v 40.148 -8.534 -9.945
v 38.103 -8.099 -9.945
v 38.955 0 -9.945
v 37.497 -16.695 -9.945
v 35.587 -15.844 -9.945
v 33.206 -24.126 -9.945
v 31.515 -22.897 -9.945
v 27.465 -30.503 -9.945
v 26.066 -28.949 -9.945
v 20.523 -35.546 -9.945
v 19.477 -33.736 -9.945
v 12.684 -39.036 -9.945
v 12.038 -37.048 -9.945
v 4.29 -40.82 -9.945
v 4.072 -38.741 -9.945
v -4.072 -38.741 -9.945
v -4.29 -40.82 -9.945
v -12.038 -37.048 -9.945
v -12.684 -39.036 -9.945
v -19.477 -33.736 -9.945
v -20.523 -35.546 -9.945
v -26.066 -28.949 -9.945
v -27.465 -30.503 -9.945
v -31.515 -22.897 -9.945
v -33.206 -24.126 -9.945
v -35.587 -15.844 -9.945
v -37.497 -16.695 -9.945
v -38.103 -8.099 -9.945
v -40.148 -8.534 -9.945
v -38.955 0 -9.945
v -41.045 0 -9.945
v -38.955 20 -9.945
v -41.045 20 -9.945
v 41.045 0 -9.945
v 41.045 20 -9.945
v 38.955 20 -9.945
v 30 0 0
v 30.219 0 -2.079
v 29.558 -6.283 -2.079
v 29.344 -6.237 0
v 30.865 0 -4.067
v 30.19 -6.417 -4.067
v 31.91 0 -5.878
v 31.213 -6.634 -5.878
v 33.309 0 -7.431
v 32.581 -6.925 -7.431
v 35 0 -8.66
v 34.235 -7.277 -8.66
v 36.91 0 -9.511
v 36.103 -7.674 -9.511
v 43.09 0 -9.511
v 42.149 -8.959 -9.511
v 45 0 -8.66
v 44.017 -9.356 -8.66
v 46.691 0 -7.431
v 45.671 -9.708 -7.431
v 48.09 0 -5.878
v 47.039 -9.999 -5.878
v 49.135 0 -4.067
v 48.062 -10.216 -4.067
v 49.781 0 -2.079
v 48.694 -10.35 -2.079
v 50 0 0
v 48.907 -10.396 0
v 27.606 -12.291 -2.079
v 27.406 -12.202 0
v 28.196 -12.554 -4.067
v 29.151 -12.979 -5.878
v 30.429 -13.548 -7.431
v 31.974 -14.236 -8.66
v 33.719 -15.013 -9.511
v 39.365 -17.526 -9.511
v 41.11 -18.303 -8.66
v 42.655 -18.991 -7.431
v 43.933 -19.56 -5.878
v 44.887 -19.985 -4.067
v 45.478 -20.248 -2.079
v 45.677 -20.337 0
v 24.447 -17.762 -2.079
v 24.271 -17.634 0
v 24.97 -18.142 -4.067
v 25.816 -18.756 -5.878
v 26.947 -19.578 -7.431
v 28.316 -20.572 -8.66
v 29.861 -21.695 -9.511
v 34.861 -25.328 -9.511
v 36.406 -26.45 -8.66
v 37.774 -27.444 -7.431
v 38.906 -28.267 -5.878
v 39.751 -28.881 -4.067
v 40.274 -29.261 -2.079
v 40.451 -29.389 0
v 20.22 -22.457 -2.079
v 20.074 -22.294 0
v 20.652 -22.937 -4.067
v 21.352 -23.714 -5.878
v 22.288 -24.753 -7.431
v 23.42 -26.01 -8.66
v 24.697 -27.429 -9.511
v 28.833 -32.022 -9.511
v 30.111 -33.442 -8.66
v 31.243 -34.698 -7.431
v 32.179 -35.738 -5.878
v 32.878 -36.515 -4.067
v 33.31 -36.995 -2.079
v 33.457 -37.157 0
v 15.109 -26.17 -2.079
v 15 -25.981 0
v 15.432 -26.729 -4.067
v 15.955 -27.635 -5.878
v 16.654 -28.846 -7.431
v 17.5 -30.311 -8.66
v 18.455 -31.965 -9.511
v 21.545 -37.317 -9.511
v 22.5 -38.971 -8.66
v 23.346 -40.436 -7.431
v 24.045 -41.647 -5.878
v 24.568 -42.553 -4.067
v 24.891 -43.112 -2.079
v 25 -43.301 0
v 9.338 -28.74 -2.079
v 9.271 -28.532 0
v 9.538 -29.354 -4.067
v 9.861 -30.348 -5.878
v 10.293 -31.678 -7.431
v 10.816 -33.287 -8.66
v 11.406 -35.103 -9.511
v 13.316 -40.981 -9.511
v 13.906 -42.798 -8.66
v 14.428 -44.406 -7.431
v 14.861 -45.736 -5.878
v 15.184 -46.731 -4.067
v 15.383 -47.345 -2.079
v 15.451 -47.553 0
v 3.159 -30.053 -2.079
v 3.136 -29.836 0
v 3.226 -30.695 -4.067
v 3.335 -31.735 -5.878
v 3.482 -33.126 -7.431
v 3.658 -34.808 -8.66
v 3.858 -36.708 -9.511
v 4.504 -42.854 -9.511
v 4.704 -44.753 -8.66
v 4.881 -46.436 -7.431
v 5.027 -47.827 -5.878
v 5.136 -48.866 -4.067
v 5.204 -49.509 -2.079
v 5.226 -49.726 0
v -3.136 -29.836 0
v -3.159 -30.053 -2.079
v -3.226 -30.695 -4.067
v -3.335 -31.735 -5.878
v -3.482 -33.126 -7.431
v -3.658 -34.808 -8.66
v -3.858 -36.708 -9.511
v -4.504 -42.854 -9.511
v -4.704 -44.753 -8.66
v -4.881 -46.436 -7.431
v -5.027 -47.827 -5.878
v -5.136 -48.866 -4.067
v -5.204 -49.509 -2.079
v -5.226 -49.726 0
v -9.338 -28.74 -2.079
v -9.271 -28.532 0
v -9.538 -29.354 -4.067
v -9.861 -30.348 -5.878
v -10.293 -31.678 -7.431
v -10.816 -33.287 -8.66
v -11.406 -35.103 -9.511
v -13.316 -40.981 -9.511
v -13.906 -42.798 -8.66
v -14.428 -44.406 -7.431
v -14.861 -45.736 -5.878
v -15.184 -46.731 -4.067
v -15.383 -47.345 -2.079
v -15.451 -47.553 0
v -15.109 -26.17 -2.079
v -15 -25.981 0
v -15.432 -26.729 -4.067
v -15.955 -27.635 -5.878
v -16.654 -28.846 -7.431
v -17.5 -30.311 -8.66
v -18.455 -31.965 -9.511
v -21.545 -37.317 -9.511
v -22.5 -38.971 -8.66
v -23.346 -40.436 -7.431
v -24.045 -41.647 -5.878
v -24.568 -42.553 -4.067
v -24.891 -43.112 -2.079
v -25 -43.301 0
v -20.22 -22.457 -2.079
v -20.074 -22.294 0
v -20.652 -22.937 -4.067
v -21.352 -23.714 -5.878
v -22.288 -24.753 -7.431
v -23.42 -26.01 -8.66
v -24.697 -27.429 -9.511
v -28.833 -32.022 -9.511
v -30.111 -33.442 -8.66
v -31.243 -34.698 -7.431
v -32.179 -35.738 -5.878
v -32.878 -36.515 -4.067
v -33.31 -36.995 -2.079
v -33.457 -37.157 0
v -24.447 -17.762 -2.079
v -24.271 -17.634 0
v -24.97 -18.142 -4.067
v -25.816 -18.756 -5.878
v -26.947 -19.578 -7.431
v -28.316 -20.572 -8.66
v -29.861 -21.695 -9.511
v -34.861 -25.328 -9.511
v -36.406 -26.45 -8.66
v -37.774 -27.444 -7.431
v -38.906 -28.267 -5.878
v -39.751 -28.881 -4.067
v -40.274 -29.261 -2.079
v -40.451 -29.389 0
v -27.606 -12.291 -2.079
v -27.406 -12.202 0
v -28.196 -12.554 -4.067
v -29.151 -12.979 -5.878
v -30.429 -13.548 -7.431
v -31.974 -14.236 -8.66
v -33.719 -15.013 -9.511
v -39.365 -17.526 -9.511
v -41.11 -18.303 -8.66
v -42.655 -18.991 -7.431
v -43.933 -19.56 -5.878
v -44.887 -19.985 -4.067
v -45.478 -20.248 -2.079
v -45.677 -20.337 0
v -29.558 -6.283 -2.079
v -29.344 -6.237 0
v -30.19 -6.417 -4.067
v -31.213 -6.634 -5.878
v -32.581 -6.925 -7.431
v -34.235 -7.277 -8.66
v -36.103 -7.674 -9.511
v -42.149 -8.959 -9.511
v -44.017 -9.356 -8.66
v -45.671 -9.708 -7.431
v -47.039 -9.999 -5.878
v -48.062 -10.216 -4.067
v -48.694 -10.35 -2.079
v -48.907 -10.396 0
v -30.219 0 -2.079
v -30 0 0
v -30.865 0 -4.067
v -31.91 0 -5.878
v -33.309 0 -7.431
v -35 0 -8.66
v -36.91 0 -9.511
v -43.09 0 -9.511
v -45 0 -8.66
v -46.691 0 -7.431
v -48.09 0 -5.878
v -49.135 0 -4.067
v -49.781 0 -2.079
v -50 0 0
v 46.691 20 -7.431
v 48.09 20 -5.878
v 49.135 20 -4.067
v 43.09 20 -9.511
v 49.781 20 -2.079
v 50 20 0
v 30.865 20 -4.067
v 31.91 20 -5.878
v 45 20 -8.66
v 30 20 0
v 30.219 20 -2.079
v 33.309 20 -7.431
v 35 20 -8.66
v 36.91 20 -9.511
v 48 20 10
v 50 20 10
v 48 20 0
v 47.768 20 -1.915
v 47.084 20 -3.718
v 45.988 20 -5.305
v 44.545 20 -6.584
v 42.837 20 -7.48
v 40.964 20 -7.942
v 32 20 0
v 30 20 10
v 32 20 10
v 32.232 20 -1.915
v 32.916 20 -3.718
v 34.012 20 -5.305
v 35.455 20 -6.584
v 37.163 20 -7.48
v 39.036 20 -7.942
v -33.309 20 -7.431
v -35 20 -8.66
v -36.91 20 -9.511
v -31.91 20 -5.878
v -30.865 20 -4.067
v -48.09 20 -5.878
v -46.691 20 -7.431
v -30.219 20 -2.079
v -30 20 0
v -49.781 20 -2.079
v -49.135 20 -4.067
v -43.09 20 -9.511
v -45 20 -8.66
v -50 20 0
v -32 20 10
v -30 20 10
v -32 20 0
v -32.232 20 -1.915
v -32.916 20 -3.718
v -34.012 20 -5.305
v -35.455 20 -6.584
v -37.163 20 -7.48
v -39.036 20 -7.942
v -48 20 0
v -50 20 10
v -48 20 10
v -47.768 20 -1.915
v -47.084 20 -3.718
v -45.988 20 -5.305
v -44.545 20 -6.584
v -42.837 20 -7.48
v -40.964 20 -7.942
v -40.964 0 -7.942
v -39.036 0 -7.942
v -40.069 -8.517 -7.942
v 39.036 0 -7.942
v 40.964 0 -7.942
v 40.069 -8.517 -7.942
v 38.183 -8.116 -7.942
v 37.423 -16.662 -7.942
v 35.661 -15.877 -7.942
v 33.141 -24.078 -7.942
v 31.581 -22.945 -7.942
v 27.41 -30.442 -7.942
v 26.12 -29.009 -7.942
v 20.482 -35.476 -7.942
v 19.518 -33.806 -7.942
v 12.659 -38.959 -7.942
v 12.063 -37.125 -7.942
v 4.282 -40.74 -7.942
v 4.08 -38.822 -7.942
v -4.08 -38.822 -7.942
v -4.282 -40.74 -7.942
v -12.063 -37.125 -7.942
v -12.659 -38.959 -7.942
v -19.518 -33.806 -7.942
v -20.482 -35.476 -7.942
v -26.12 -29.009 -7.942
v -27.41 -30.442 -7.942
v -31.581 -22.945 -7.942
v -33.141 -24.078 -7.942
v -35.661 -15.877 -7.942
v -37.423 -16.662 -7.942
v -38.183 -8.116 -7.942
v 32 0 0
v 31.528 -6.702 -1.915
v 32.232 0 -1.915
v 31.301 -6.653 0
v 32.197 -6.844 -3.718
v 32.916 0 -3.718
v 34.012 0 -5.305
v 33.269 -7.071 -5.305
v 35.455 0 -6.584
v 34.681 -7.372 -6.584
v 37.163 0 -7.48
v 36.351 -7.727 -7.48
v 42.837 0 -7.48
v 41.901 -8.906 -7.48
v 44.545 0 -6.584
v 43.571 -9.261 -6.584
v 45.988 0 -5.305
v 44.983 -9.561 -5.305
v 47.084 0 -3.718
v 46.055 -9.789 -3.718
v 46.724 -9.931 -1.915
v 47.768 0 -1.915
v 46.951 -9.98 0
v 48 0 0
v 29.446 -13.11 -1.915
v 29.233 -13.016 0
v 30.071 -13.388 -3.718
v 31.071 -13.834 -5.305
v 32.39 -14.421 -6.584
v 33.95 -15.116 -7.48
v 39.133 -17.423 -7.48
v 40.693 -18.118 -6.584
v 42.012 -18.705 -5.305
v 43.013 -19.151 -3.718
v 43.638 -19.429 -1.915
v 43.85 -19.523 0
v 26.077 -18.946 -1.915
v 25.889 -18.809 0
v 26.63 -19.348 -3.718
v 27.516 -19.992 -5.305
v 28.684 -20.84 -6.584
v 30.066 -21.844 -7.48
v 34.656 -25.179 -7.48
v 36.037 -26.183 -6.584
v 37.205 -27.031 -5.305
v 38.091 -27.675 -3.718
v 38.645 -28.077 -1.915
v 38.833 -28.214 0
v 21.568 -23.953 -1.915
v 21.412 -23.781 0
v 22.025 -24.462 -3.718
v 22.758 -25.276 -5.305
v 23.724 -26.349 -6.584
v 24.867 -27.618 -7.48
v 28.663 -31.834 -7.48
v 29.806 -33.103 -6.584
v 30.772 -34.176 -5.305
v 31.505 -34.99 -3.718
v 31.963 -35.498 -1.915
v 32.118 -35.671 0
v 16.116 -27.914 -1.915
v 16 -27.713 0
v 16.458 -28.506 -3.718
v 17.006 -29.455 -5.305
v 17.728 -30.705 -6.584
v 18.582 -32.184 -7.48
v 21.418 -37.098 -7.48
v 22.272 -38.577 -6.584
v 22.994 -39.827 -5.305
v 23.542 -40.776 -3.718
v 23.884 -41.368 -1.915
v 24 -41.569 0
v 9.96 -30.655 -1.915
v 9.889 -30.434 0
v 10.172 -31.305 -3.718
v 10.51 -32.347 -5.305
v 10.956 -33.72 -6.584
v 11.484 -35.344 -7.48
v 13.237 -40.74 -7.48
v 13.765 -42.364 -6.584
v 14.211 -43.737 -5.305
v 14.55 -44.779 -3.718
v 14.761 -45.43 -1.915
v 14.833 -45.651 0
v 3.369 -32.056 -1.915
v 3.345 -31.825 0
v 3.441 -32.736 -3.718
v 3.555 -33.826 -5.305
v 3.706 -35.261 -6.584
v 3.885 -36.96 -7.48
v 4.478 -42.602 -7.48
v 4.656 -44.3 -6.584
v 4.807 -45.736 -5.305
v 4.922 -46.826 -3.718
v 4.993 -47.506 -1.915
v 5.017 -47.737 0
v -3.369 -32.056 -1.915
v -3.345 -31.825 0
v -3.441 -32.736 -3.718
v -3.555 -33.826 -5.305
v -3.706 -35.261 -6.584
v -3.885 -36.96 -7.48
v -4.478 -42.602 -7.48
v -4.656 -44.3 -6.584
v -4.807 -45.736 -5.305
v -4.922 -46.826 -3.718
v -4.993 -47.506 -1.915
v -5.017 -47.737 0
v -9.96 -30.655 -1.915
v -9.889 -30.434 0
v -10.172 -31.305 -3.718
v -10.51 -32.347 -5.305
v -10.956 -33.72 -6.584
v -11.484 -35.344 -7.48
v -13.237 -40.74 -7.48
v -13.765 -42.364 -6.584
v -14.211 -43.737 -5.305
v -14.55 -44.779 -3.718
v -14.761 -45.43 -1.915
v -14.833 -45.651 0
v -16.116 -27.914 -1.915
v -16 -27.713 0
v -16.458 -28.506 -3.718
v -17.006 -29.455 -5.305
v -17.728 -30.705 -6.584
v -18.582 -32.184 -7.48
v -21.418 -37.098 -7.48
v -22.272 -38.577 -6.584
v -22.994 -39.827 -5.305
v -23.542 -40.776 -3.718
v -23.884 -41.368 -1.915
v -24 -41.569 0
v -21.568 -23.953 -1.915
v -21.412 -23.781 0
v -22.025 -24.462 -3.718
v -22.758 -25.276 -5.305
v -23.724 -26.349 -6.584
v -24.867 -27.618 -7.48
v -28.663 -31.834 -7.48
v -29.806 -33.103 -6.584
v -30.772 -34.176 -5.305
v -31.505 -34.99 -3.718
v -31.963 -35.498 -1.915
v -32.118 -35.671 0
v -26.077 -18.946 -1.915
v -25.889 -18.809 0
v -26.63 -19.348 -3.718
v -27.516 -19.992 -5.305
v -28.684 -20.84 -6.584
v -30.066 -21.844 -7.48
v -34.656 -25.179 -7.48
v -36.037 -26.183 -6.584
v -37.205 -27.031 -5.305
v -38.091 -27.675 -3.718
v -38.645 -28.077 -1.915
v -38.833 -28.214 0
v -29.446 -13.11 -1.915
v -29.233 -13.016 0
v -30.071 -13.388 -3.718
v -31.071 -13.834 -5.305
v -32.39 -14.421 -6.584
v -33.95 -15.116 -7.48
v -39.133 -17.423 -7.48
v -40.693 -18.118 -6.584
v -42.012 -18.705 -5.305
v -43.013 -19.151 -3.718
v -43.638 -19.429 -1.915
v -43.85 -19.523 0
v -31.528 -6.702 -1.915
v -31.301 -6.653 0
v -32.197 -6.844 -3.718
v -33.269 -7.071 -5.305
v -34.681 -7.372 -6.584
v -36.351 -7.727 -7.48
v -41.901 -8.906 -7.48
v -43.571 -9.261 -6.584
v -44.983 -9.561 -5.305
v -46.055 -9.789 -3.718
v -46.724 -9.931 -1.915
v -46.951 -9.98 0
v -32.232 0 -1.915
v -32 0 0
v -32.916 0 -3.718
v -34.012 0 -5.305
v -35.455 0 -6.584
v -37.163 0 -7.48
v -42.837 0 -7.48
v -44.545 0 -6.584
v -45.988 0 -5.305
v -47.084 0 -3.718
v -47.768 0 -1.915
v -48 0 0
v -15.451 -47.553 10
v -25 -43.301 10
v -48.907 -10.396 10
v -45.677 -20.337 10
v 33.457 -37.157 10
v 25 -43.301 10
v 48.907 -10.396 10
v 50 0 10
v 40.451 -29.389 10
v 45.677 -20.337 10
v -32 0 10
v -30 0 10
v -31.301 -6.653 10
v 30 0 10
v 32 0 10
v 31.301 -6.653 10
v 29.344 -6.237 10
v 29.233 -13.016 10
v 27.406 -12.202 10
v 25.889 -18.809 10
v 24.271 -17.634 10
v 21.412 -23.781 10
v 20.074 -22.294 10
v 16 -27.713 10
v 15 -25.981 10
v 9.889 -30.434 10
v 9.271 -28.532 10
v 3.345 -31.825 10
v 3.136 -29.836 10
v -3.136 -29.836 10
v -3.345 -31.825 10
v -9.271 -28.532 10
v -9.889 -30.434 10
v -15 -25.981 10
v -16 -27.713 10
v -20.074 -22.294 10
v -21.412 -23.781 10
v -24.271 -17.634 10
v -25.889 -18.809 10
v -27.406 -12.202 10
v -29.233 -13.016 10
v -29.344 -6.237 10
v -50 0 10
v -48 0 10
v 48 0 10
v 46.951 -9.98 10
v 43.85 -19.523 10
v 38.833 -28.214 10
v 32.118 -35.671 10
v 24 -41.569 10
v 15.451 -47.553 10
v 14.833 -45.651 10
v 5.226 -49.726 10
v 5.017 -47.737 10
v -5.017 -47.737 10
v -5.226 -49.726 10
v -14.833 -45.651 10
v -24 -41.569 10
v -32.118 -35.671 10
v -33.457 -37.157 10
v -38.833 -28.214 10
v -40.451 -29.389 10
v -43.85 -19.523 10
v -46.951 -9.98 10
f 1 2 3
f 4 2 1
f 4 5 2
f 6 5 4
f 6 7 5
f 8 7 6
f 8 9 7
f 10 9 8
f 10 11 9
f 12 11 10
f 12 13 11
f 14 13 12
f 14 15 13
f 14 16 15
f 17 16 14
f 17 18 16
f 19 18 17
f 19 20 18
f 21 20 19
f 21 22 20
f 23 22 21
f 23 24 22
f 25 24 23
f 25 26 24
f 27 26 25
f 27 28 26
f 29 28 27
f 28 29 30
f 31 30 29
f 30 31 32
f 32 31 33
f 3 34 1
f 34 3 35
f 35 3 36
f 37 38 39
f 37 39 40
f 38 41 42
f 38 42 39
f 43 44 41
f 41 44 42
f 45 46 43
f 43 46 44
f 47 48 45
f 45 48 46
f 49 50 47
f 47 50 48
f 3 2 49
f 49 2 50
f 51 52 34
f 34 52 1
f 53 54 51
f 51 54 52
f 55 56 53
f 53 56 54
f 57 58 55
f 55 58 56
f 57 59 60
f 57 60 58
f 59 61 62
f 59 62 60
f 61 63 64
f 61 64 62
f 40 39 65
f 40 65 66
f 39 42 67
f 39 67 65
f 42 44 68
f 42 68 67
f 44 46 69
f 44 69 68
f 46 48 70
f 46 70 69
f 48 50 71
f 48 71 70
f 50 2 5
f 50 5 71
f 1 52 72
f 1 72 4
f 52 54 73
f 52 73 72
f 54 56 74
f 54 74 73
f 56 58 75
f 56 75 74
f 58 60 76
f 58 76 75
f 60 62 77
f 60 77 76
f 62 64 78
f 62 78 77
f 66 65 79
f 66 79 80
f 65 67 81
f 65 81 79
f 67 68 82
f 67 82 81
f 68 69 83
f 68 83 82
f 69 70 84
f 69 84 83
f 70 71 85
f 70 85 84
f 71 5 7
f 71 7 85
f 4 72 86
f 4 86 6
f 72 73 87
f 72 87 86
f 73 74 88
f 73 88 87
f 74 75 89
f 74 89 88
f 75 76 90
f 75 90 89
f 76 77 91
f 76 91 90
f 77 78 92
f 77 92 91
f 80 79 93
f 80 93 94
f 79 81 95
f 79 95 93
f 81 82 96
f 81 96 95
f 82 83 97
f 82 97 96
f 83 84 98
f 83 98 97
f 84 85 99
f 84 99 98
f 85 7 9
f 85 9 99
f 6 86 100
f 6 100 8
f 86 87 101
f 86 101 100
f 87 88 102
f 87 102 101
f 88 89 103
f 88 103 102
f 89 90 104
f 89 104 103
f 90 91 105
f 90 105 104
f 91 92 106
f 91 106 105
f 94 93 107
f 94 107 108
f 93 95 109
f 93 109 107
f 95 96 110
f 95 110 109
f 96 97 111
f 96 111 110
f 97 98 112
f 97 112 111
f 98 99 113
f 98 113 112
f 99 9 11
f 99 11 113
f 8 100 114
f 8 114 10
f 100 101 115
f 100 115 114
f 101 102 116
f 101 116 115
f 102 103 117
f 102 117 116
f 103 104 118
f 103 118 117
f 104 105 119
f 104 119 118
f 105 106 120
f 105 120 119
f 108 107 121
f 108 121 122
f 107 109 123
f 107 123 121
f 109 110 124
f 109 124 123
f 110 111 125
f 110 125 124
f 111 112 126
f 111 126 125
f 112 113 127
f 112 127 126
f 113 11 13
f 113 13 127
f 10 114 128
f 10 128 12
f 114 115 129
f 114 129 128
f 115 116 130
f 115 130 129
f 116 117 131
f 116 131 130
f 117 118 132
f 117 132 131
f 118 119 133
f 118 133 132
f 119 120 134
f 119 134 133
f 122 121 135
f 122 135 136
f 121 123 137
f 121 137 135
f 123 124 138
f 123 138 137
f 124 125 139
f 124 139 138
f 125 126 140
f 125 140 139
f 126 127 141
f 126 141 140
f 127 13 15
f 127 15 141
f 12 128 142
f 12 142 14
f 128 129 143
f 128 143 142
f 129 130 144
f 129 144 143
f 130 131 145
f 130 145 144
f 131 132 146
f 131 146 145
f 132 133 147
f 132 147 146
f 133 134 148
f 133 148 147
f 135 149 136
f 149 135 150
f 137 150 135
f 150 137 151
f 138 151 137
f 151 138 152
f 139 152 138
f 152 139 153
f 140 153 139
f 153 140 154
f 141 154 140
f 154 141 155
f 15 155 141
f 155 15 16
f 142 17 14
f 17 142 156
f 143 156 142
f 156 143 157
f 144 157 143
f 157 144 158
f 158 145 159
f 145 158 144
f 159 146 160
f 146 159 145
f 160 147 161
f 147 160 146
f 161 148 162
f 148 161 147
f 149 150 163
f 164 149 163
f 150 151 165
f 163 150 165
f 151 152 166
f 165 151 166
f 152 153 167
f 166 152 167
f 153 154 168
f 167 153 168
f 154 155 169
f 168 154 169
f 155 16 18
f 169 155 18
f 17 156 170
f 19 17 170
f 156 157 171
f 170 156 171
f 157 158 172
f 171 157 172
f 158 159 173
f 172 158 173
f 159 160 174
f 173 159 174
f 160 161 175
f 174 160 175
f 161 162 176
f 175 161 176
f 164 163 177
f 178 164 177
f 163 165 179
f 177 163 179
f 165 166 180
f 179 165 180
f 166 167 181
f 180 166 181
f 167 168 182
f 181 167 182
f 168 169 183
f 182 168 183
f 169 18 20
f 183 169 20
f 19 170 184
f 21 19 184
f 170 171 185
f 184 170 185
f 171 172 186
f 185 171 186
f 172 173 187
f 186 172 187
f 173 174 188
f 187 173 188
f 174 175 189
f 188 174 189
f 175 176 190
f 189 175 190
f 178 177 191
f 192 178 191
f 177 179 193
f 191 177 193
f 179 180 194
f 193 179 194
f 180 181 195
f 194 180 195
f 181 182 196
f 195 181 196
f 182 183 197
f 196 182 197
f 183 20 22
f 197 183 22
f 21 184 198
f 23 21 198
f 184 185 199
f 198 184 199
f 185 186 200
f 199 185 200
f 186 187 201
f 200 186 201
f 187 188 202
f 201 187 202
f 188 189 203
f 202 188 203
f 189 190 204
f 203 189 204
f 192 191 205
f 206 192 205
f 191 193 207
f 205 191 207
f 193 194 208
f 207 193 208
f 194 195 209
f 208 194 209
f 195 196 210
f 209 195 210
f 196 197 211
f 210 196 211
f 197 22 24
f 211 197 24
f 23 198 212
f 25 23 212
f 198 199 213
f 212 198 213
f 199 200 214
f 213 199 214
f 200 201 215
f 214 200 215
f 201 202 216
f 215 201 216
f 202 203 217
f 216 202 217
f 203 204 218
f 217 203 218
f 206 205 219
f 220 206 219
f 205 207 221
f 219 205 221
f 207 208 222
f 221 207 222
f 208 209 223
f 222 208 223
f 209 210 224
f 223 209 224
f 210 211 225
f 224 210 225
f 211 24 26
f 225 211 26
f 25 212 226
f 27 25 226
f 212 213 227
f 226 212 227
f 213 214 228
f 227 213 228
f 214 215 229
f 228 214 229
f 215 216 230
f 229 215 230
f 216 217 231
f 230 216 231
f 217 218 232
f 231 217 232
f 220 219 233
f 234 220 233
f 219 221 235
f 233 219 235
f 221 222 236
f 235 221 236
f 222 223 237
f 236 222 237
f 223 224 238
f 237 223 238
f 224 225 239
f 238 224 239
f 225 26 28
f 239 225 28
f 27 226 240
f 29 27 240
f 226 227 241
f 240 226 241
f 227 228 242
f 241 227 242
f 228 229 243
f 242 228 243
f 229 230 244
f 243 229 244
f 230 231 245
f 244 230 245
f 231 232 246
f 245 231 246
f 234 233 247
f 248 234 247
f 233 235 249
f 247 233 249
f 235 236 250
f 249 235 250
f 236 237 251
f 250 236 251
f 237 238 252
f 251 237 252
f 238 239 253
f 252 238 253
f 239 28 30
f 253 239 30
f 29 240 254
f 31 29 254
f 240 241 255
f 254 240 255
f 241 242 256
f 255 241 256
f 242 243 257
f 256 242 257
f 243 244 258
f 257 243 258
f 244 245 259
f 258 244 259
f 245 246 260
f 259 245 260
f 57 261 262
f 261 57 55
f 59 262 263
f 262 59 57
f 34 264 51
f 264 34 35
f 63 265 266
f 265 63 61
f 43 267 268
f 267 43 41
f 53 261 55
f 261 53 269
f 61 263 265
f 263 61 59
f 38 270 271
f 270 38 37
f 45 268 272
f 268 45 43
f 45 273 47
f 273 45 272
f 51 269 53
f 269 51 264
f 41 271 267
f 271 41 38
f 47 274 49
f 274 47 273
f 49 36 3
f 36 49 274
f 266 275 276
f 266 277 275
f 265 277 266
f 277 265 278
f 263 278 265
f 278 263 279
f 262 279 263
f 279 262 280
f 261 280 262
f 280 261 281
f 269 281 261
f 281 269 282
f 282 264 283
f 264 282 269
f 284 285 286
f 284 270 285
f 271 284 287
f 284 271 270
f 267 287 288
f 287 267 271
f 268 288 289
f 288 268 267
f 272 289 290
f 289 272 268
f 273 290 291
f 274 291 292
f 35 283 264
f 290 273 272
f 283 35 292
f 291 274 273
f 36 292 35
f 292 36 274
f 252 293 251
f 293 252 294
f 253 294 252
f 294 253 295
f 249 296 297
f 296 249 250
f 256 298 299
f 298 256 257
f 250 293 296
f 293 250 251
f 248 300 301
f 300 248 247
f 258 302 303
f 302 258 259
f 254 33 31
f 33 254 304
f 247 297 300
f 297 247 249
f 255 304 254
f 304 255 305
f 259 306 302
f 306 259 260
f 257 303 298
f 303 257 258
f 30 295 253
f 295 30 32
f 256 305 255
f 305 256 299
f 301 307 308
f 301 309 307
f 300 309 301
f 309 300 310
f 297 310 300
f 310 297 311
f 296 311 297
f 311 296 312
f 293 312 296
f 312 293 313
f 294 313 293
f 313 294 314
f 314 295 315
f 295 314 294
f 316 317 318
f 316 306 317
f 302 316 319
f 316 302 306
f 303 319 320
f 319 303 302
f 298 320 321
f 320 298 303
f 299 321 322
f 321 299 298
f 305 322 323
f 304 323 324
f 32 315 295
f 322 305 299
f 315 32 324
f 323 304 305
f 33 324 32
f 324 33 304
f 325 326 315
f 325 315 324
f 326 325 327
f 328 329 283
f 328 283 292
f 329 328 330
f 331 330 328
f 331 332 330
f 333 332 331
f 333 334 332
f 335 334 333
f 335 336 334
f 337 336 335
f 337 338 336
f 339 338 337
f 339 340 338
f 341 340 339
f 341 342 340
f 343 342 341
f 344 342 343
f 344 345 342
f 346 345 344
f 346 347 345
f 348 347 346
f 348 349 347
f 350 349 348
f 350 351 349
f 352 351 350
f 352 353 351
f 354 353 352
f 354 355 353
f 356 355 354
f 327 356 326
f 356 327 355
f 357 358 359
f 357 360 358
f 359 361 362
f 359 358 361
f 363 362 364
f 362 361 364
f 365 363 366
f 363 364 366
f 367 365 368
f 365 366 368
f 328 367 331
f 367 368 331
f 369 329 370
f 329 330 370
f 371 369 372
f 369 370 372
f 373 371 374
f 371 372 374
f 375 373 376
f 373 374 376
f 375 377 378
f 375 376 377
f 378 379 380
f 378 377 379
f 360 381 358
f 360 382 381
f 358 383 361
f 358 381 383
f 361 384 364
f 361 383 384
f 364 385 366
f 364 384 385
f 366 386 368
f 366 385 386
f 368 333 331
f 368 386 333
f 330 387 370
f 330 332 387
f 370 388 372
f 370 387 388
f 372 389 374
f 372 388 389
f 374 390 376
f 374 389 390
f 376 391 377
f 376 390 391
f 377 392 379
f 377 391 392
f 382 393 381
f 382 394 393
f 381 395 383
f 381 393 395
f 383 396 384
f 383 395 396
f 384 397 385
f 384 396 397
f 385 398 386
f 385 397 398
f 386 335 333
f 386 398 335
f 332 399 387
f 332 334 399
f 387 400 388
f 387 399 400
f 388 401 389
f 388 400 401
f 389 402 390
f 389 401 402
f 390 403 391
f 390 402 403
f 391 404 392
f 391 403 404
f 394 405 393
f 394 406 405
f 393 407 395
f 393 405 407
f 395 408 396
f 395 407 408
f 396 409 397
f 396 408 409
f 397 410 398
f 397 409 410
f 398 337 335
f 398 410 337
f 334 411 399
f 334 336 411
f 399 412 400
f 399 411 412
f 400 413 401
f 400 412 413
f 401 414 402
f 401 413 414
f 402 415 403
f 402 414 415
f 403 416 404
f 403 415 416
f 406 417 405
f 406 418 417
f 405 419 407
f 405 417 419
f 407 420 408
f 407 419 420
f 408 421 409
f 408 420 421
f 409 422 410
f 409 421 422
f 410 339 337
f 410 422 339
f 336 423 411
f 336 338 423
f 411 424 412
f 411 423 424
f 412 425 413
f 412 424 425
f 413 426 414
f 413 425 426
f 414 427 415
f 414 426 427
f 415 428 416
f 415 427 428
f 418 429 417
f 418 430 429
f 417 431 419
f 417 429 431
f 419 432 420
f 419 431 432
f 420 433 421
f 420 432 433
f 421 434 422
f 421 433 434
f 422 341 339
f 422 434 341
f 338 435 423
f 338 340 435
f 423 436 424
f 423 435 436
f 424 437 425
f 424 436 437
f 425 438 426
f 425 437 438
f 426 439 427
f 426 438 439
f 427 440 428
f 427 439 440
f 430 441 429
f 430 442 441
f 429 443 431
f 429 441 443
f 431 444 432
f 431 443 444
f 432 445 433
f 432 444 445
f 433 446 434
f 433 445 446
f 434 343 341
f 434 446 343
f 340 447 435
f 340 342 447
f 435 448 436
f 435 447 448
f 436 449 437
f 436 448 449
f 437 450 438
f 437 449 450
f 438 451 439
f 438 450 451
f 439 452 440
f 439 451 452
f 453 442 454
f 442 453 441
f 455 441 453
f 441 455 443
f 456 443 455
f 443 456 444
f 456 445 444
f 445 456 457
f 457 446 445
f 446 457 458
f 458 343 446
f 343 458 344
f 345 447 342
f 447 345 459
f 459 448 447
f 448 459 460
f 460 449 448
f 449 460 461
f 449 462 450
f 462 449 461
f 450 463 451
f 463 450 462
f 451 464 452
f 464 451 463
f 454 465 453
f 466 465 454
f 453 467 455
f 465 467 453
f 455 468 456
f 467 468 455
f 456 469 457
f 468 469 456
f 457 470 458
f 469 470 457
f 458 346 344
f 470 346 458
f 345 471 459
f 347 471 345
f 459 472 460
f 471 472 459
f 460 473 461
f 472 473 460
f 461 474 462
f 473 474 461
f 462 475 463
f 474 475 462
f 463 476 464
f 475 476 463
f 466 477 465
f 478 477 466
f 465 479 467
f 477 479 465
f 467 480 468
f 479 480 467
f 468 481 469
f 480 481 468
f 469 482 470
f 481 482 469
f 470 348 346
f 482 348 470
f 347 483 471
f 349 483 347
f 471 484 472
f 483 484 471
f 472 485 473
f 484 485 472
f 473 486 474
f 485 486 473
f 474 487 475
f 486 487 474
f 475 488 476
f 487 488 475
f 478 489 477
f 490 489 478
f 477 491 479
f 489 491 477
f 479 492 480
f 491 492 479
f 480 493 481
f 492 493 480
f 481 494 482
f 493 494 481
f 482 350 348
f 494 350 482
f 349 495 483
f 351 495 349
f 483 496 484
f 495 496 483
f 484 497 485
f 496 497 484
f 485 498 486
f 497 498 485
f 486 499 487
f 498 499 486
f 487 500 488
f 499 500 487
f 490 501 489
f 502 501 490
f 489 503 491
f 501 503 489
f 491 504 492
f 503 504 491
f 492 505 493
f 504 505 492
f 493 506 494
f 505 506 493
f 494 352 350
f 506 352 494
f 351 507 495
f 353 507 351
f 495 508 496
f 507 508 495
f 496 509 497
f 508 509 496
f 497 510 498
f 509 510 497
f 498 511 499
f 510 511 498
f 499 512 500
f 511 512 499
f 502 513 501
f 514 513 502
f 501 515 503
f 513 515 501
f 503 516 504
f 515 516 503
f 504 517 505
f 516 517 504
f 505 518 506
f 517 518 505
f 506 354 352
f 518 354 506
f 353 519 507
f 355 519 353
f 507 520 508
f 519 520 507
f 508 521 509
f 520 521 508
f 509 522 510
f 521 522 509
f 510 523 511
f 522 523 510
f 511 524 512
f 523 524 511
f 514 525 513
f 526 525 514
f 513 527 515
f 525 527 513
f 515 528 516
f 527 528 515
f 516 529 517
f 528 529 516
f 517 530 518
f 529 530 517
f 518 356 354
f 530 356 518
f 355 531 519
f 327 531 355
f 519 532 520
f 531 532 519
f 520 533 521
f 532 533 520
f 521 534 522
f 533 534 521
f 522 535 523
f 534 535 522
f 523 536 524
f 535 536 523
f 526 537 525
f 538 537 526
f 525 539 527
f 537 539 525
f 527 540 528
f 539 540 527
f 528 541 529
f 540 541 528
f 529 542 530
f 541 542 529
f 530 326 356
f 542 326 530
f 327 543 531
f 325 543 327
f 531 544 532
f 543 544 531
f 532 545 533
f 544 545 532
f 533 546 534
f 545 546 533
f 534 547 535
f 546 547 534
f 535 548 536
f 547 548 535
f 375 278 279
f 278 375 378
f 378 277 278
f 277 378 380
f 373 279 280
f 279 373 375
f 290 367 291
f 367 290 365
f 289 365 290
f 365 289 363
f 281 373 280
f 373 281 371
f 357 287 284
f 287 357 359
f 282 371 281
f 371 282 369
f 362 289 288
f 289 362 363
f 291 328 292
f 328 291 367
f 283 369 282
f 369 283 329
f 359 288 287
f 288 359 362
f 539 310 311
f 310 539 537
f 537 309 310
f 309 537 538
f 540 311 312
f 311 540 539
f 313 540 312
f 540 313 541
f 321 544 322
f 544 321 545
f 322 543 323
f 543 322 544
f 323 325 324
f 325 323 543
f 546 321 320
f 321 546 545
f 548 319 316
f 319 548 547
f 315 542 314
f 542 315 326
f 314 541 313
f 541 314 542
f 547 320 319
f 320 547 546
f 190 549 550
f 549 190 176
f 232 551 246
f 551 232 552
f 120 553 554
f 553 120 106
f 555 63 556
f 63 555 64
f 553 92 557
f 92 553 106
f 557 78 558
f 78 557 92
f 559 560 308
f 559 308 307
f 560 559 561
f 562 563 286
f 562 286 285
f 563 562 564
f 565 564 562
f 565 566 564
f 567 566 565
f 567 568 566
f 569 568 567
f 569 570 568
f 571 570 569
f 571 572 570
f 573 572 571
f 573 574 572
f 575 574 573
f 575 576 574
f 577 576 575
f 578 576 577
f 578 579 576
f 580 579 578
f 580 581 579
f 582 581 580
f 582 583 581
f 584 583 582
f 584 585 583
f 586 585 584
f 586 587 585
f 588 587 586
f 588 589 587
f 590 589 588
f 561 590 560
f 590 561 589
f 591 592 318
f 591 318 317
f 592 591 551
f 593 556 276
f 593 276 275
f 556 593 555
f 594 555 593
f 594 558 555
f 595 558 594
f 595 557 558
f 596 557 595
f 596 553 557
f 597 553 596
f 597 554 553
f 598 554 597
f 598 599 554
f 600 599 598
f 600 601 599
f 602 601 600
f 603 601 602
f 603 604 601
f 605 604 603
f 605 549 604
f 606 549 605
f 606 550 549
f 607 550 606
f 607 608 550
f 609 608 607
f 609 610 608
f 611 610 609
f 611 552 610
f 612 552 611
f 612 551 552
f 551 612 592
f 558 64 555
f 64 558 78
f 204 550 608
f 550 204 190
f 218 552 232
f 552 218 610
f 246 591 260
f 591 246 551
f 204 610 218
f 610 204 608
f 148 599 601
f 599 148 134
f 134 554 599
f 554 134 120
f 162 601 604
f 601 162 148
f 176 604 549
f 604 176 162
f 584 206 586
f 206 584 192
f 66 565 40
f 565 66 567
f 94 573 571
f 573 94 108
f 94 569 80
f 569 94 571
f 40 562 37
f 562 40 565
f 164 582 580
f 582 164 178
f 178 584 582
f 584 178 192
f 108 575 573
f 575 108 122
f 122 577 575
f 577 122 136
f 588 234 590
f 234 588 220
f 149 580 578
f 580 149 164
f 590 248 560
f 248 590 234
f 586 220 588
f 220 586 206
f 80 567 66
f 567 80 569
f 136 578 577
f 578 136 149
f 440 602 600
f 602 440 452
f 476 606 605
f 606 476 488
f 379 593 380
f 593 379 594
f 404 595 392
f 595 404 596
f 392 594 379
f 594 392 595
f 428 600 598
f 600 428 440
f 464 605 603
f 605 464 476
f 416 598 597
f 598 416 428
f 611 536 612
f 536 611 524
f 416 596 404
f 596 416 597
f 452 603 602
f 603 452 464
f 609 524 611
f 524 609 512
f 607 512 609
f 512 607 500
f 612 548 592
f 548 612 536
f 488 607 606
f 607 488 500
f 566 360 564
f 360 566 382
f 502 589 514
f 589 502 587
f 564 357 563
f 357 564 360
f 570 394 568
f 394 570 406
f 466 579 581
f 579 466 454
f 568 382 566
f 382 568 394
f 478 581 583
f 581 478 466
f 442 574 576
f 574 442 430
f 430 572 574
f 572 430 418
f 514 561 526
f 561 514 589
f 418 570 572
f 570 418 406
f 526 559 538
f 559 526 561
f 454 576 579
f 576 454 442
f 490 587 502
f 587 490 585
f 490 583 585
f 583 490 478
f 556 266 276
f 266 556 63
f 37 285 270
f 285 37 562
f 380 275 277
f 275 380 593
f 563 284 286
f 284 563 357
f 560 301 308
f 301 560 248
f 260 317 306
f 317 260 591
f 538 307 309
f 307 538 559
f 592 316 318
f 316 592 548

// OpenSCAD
difference() {
  u(40,10,20);
  u(40,8,21);
  translate([-50,-50,0]) cube([50*2,100,10]);
}


difference() {
difference() {
  cylinder(r=40+10,h=10);
  translate([0,0,-0.1]) cylinder(r=40-10,h=10.2);
}

translate([0,0,-0.1]) difference() {
  cylinder(r=40+8,h=10.2);
  translate([0,0,-0.1]) cylinder(r=40-8,h=10.4);
}
  translate([-50,0,-0.1]) cube([50*2,100,10.2]);

}

translate([30,0,0]) difference() {
  cube([20,20,10]);
  translate([2,0,-0.1]) cube([16,21,10.2]);
}


translate([-50,0,0]) difference() {
  cube([20,20,10]);
  translate([2,0,-0.1]) cube([16,21,10.2]);
}


module u(r1,r2,h) {
  difference() {
    torus(r1,r2);
    translate([-(r1+r2),0,-r2]) cube([(r1+r2)*2,(r1+r2),r2*2]);
  }
  translate([r1,0,0]) rotate([-90,0,0]) cylinder(r=r2,h=h);
  translate([-r1,0,0]) rotate([-90,0,0]) cylinder(r=r2,h=h);

}

module torus(r1,r2) {
  rotate_extrude(convexity = 10, $fn=$fn)
    translate([r1, 0, 0])
    circle(r = r2, $fn=$fn);
}
